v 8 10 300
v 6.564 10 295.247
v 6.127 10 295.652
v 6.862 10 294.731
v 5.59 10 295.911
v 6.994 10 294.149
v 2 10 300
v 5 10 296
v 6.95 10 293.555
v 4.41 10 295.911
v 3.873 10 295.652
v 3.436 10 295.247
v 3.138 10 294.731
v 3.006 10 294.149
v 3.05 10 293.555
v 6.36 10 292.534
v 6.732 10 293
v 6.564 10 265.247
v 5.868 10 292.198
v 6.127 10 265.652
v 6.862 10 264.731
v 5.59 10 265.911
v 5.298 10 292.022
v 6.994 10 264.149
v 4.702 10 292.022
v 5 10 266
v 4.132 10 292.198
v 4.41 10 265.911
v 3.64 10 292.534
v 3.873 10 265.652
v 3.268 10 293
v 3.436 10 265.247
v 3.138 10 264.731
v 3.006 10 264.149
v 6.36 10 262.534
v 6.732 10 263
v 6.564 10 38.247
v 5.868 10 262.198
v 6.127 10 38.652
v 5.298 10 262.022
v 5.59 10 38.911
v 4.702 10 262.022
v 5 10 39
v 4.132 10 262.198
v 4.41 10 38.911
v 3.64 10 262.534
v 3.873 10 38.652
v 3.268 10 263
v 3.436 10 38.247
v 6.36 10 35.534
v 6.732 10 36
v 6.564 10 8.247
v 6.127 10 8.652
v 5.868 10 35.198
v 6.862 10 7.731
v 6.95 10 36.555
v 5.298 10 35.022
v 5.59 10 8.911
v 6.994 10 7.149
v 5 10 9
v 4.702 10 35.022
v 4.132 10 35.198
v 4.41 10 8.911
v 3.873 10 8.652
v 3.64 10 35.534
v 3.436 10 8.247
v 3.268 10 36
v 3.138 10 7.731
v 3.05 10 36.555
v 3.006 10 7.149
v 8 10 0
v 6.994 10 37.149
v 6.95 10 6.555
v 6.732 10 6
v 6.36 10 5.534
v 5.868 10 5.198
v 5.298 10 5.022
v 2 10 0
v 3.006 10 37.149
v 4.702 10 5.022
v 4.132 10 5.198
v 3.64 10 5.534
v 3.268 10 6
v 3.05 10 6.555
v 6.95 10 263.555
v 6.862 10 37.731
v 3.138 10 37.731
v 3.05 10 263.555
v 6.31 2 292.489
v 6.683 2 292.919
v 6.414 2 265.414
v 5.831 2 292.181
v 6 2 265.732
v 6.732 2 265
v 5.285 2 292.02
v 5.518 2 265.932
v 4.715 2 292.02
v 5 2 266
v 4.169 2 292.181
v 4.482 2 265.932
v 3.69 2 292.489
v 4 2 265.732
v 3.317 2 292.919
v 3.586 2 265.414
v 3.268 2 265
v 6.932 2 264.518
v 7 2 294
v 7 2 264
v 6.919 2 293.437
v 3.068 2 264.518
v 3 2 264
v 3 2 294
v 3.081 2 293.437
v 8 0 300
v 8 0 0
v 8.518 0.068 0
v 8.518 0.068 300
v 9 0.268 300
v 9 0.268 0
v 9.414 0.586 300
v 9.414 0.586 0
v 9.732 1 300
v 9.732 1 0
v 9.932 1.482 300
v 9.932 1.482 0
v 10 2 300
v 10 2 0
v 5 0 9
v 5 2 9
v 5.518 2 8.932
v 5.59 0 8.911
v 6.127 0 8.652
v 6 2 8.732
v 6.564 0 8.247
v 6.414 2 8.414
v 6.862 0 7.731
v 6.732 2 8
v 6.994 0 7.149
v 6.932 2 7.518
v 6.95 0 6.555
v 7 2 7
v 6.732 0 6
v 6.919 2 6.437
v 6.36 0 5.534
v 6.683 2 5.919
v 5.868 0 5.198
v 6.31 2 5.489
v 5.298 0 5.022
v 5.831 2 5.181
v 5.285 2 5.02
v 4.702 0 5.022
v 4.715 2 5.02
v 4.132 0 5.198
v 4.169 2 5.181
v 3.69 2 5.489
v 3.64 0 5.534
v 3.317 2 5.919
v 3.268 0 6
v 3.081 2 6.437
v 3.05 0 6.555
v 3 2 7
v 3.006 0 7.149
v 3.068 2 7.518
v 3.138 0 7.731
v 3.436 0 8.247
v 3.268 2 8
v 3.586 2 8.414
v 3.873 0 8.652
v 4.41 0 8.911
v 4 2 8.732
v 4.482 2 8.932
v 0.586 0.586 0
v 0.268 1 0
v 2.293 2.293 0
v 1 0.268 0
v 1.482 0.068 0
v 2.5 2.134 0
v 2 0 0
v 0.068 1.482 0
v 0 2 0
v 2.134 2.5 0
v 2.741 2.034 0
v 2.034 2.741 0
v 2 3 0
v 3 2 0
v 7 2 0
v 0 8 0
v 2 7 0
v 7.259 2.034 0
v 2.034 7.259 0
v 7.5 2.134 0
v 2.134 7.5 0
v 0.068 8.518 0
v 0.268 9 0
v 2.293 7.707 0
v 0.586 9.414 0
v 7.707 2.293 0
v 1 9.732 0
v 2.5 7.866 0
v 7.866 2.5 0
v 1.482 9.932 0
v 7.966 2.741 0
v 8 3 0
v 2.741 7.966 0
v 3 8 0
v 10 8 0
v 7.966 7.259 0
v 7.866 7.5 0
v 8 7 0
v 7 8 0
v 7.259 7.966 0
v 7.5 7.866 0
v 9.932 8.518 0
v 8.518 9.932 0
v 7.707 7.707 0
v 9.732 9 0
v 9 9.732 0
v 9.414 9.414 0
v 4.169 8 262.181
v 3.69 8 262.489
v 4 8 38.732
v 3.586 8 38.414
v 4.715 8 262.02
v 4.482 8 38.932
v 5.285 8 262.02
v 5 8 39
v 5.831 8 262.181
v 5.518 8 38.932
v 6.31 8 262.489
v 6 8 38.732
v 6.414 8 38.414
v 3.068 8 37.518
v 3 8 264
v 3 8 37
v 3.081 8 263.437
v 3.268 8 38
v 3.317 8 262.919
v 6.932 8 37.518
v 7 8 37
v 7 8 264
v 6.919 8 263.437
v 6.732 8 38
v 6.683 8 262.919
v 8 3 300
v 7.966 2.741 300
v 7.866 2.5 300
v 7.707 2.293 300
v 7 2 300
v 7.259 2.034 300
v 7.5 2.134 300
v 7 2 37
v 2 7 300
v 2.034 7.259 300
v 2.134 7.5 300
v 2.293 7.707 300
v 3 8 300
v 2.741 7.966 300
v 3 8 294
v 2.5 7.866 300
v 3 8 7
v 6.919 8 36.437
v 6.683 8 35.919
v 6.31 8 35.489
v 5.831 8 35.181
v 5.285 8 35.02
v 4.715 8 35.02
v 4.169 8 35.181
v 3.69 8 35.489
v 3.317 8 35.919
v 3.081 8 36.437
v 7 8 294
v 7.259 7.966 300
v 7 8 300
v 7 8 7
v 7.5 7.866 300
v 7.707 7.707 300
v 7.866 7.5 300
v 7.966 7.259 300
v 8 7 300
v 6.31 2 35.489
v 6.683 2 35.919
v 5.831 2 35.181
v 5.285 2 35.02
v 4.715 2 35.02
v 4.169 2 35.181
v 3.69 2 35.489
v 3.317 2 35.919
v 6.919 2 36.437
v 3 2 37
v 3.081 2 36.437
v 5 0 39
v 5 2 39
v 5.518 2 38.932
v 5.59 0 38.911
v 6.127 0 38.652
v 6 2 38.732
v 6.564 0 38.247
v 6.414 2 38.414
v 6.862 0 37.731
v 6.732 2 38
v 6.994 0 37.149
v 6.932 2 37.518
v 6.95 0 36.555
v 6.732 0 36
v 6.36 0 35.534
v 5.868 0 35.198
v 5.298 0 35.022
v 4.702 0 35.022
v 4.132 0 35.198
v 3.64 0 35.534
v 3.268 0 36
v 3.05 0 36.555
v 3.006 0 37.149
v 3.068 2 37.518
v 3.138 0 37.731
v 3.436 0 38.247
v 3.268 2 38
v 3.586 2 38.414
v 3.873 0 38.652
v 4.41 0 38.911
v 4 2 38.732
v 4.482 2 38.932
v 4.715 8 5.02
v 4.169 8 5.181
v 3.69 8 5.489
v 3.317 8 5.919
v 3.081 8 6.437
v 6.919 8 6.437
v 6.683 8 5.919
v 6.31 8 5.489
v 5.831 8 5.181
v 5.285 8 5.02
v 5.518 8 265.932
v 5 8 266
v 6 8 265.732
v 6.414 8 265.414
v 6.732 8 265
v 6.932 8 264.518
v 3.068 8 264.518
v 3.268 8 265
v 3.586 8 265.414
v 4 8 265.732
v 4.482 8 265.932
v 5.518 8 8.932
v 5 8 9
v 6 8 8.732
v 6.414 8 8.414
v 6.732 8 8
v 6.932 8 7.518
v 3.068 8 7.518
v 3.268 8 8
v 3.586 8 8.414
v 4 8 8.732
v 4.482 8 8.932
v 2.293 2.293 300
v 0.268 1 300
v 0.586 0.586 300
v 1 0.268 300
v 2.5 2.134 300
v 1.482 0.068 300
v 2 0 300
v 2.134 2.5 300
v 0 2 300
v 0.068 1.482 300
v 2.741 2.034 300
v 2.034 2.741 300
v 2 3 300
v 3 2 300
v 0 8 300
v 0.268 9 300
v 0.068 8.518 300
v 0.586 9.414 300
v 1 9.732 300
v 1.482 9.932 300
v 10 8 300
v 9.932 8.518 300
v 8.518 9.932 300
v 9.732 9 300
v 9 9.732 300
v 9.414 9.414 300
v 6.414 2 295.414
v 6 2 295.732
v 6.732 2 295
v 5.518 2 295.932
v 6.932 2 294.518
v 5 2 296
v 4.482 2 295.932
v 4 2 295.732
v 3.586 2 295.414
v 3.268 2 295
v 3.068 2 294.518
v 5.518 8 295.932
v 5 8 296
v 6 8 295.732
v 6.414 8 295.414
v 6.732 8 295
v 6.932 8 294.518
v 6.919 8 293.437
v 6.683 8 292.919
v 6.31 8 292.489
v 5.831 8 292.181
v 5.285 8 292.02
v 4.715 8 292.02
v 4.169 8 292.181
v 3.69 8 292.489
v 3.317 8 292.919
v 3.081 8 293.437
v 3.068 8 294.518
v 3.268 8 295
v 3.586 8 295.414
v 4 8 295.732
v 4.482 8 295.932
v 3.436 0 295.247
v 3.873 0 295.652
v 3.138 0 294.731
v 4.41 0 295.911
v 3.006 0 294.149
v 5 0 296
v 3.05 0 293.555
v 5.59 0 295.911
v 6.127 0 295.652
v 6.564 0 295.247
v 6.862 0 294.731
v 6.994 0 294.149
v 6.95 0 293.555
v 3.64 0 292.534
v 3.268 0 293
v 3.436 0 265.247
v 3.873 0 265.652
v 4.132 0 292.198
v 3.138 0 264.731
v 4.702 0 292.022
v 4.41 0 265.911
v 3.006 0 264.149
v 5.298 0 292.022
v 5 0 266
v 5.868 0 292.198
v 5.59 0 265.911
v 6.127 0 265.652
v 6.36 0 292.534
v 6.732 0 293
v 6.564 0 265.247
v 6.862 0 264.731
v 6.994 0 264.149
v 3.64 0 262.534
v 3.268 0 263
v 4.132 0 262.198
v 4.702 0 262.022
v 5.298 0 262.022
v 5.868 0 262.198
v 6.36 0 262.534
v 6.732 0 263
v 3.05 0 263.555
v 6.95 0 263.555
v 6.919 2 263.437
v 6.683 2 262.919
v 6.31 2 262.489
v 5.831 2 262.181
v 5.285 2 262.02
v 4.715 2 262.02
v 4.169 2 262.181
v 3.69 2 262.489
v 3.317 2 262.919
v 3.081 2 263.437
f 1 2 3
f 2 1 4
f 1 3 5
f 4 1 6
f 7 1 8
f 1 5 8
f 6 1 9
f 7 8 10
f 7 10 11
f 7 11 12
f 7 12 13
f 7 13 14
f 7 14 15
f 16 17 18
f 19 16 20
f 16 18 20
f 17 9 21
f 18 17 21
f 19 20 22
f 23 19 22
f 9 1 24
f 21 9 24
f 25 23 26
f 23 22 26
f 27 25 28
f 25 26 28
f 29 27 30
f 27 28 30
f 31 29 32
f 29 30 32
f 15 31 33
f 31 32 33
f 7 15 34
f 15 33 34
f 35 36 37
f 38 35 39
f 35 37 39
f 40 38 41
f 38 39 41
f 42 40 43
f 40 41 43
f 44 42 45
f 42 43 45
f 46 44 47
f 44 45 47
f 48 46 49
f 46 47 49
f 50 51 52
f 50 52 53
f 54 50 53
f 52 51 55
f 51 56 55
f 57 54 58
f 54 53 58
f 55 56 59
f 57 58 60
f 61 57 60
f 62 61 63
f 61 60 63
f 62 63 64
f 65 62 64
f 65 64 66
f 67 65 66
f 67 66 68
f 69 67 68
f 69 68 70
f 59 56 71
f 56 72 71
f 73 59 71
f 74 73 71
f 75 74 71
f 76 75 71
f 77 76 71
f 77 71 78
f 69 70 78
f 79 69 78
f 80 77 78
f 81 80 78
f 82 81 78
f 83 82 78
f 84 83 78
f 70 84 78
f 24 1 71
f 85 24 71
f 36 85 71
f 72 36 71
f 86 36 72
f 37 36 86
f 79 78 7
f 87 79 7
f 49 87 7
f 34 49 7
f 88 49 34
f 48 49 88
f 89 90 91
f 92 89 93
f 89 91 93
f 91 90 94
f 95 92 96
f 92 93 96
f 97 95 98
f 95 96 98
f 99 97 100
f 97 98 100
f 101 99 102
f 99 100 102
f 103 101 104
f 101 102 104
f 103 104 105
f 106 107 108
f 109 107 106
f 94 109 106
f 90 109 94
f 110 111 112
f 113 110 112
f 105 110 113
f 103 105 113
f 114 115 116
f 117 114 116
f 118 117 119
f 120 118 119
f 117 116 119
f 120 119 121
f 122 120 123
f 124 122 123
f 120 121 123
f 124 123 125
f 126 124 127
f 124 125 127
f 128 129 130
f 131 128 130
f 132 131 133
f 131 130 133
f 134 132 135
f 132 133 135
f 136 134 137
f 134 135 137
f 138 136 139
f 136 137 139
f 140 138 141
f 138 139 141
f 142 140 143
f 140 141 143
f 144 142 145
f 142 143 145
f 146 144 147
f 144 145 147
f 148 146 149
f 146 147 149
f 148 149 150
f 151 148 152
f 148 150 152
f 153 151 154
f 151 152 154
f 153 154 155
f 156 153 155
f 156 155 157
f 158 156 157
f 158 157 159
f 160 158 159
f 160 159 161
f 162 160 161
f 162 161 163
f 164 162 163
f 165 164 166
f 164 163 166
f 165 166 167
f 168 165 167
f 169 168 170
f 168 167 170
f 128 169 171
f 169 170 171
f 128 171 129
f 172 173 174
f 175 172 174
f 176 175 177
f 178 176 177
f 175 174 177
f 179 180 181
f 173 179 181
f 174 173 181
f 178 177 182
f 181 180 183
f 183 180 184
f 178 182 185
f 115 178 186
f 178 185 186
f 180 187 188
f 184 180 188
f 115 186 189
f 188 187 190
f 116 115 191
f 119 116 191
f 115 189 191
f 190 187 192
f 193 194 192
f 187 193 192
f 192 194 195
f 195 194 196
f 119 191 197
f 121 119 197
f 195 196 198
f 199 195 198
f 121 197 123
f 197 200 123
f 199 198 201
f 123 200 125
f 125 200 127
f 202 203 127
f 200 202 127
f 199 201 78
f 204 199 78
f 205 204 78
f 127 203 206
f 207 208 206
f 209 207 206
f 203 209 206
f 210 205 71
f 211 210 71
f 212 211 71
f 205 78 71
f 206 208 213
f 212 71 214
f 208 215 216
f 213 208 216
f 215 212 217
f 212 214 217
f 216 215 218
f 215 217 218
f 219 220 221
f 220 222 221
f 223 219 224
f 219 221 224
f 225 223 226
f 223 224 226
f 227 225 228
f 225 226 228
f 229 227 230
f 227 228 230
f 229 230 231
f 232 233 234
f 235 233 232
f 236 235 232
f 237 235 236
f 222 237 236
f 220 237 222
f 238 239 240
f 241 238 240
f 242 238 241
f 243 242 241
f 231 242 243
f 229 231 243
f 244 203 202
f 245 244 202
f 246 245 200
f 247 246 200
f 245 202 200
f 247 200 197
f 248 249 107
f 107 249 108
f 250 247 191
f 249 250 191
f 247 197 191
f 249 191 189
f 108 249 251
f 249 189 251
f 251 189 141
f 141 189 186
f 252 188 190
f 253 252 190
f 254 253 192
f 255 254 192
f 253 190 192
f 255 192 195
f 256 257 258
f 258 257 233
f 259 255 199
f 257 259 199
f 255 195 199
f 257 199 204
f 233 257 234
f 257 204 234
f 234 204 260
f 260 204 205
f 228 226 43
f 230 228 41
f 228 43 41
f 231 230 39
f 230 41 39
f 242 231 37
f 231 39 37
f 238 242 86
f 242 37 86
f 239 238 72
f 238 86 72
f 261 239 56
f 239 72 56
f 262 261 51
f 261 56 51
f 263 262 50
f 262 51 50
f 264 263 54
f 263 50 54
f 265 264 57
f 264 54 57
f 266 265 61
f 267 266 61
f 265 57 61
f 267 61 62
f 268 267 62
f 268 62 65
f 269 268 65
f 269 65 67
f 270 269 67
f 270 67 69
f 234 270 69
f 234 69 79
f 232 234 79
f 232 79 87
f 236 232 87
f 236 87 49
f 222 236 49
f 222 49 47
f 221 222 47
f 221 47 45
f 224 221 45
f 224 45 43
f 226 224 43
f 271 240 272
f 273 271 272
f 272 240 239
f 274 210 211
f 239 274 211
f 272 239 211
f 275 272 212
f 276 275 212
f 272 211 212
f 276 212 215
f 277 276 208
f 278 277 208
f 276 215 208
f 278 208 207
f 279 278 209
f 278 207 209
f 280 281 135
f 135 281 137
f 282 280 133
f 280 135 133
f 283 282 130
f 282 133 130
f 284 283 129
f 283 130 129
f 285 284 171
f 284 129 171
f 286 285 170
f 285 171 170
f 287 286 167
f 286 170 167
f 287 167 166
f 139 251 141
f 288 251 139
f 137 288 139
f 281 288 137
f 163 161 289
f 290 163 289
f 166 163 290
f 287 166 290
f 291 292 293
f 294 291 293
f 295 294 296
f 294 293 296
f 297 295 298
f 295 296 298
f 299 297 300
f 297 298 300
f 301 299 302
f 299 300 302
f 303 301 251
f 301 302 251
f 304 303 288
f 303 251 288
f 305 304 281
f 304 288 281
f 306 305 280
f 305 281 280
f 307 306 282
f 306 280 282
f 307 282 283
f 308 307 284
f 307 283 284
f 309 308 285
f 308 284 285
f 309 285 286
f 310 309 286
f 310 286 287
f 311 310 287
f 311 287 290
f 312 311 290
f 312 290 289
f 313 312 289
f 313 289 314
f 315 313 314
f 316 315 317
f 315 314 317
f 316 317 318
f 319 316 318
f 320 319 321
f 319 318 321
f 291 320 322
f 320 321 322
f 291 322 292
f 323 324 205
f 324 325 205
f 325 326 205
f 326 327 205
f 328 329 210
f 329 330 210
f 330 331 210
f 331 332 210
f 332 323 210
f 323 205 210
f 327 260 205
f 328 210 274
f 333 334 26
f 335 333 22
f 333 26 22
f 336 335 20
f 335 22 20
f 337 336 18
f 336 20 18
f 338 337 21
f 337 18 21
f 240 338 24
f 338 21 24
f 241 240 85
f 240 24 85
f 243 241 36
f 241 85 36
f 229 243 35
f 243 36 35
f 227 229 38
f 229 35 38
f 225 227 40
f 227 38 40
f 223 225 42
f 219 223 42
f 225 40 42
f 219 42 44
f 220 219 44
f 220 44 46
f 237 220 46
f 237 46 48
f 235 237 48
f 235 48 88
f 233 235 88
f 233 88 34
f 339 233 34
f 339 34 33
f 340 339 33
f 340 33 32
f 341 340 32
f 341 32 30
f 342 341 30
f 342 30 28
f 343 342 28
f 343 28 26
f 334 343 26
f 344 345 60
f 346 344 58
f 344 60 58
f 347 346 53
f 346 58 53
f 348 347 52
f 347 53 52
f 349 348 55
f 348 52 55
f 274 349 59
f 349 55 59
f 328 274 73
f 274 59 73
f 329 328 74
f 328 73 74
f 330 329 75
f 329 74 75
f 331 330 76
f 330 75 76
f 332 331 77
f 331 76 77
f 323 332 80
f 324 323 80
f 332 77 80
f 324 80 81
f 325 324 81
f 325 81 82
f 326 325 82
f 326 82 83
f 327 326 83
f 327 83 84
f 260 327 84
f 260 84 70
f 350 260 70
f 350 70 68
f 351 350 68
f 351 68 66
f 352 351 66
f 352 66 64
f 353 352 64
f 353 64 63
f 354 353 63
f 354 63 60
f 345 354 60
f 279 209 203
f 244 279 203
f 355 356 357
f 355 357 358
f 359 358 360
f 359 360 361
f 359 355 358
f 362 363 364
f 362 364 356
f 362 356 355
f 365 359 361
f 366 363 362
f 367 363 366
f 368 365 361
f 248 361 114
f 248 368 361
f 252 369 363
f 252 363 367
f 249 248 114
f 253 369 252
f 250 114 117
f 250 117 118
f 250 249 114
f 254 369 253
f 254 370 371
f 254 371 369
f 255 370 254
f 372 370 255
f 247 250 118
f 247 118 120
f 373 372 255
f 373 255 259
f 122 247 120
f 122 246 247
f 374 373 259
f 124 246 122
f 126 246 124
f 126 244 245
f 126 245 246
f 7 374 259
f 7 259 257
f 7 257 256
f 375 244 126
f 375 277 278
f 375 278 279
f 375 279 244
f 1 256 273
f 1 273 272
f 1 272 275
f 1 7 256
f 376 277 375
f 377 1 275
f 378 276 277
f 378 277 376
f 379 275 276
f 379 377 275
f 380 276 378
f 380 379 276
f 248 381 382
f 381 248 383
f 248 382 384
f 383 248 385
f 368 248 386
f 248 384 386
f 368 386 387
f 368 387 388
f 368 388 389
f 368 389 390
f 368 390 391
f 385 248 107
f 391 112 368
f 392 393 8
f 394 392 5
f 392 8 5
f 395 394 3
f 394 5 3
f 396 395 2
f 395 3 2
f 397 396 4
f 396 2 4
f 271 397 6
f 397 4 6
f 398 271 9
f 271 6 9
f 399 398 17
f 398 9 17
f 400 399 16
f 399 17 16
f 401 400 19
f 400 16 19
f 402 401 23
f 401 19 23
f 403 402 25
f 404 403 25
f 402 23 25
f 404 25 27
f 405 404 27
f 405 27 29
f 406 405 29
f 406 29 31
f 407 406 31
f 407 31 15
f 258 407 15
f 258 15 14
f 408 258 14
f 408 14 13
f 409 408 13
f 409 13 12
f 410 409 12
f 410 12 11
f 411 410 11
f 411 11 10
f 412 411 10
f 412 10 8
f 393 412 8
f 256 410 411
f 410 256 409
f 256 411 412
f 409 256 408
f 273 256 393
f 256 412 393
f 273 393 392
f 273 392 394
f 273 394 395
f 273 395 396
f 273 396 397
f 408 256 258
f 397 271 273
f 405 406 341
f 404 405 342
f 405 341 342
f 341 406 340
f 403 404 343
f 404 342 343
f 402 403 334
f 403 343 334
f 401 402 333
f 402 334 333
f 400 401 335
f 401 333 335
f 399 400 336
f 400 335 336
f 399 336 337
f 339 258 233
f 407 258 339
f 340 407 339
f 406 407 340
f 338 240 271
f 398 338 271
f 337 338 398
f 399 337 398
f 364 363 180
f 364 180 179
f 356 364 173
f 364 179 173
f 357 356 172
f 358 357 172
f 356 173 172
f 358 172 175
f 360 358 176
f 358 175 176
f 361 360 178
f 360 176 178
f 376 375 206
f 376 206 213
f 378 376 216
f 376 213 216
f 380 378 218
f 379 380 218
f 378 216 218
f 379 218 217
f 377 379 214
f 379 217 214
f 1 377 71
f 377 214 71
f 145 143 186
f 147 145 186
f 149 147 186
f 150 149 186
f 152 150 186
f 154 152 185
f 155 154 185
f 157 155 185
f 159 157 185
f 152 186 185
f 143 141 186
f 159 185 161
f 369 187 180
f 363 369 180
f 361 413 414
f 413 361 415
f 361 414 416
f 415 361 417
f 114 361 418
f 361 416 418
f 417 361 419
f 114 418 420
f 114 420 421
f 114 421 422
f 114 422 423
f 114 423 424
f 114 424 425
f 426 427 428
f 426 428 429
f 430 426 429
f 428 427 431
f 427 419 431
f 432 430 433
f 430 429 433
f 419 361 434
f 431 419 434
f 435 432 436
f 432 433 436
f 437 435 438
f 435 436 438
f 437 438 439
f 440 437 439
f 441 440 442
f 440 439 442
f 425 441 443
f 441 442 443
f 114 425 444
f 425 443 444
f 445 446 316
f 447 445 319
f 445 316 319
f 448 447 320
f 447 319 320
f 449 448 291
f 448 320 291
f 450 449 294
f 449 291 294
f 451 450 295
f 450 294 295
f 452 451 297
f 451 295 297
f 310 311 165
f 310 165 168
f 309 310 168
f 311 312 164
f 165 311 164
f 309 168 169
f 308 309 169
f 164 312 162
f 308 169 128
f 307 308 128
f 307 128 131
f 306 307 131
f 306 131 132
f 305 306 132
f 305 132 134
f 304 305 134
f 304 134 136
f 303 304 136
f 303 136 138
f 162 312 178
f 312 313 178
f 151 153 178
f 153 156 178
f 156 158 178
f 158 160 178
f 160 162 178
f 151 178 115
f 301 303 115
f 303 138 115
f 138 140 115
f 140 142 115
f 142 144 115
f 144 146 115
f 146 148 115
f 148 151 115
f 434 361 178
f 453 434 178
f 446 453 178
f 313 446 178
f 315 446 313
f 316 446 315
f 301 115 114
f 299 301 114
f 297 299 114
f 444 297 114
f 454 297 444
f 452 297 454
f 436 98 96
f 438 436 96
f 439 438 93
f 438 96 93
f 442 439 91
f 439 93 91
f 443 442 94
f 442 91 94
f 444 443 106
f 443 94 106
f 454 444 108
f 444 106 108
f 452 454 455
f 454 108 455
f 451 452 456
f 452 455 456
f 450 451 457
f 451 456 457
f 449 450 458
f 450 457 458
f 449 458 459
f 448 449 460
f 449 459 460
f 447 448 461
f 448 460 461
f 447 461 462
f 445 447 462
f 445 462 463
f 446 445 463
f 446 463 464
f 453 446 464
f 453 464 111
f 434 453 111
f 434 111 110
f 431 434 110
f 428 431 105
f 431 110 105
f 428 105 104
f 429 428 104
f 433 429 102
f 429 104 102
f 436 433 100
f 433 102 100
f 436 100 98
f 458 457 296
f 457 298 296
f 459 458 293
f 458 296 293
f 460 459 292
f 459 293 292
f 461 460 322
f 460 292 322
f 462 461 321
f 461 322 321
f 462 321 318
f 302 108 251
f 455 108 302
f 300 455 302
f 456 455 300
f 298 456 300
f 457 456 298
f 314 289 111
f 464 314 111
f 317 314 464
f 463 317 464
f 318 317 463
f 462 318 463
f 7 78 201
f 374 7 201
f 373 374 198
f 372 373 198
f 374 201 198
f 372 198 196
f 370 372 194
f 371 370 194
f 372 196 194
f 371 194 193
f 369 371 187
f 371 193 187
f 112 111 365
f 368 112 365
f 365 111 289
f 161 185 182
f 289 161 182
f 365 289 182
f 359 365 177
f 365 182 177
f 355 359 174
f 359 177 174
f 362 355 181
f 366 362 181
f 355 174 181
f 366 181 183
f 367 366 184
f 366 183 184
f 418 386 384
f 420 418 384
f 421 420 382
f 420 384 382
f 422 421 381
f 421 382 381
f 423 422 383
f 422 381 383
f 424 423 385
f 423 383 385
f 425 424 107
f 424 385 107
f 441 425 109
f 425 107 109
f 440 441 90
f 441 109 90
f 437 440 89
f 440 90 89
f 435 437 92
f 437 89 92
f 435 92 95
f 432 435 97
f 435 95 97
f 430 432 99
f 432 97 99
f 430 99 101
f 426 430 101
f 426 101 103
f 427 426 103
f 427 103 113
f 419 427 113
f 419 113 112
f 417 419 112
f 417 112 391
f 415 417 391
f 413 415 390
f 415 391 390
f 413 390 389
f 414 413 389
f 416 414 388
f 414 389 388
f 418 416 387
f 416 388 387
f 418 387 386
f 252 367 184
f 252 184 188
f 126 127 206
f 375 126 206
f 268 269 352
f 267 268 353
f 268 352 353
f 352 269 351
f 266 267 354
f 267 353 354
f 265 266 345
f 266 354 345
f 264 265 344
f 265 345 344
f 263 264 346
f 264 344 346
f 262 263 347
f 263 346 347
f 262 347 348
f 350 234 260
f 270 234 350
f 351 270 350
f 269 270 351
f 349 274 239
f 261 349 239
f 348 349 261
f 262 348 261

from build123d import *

# Parameters (mm, degrees)
BOSS_EXTRU_1_DEPTH      = 300
ESQUISSE2_R             = 2
ENL_V_MAT_EXTRU_1_DEPTH = 301.333148354


with BuildPart() as part:
    # Esquisse1 → Boss.-Extru.1 (new body)
    with BuildSketch(Plane.XY):
        with BuildLine():
            Line((2, 0), (8, 0))
            ThreePointArc((8, 0), (9.414213562, 0.585786438), (10, 2))
            Line((10, 2), (10, 8))
            ThreePointArc((10, 8), (9.414213562, 9.414213562), (8, 10))
            Line((8, 10), (2, 10))
            ThreePointArc((2, 10), (0.585786438, 9.414213562), (0, 8))
            Line((0, 8), (0, 2))
            ThreePointArc((0, 2), (0.585786438, 0.585786438), (2, 0))
        make_face()
        with BuildLine():
            Line((3, 8), (7, 8))
            ThreePointArc((7, 8), (7.707106781, 7.707106781), (8, 7))
            Line((8, 7), (8, 3))
            ThreePointArc((8, 3), (7.707106781, 2.292893219), (7, 2))
            Line((7, 2), (3, 2))
            ThreePointArc((3, 2), (2.292893219, 2.292893219), (2, 3))
            Line((2, 3), (2, 7))
            ThreePointArc((2, 7), (2.292893219, 7.707106781), (3, 8))
        make_face(mode=Mode.SUBTRACT)
    extrude(amount=BOSS_EXTRU_1_DEPTH)

    # Esquisse2 → Enlèv. mat.-Extru.1 (cut, through all)
    with BuildSketch(Plane(origin=(0, 10, 0), x_dir=(1, 0, 0), z_dir=(0, 1, 0))):
        with Locations(Location((5, -294, 0), (0, 0, 270))):
            Circle(ESQUISSE2_R)
        with Locations(Location((5, -264, 0), (0, 0, 270))):
            Circle(ESQUISSE2_R)
        with Locations(Location((5, -7, 0), (0, 0, 270))):
            Circle(ESQUISSE2_R)
        with Locations(Location((5, -37, 0), (0, 0, 270))):
            Circle(ESQUISSE2_R)
    extrude(amount=-ENL_V_MAT_EXTRU_1_DEPTH, mode=Mode.SUBTRACT)


solid = part.part
